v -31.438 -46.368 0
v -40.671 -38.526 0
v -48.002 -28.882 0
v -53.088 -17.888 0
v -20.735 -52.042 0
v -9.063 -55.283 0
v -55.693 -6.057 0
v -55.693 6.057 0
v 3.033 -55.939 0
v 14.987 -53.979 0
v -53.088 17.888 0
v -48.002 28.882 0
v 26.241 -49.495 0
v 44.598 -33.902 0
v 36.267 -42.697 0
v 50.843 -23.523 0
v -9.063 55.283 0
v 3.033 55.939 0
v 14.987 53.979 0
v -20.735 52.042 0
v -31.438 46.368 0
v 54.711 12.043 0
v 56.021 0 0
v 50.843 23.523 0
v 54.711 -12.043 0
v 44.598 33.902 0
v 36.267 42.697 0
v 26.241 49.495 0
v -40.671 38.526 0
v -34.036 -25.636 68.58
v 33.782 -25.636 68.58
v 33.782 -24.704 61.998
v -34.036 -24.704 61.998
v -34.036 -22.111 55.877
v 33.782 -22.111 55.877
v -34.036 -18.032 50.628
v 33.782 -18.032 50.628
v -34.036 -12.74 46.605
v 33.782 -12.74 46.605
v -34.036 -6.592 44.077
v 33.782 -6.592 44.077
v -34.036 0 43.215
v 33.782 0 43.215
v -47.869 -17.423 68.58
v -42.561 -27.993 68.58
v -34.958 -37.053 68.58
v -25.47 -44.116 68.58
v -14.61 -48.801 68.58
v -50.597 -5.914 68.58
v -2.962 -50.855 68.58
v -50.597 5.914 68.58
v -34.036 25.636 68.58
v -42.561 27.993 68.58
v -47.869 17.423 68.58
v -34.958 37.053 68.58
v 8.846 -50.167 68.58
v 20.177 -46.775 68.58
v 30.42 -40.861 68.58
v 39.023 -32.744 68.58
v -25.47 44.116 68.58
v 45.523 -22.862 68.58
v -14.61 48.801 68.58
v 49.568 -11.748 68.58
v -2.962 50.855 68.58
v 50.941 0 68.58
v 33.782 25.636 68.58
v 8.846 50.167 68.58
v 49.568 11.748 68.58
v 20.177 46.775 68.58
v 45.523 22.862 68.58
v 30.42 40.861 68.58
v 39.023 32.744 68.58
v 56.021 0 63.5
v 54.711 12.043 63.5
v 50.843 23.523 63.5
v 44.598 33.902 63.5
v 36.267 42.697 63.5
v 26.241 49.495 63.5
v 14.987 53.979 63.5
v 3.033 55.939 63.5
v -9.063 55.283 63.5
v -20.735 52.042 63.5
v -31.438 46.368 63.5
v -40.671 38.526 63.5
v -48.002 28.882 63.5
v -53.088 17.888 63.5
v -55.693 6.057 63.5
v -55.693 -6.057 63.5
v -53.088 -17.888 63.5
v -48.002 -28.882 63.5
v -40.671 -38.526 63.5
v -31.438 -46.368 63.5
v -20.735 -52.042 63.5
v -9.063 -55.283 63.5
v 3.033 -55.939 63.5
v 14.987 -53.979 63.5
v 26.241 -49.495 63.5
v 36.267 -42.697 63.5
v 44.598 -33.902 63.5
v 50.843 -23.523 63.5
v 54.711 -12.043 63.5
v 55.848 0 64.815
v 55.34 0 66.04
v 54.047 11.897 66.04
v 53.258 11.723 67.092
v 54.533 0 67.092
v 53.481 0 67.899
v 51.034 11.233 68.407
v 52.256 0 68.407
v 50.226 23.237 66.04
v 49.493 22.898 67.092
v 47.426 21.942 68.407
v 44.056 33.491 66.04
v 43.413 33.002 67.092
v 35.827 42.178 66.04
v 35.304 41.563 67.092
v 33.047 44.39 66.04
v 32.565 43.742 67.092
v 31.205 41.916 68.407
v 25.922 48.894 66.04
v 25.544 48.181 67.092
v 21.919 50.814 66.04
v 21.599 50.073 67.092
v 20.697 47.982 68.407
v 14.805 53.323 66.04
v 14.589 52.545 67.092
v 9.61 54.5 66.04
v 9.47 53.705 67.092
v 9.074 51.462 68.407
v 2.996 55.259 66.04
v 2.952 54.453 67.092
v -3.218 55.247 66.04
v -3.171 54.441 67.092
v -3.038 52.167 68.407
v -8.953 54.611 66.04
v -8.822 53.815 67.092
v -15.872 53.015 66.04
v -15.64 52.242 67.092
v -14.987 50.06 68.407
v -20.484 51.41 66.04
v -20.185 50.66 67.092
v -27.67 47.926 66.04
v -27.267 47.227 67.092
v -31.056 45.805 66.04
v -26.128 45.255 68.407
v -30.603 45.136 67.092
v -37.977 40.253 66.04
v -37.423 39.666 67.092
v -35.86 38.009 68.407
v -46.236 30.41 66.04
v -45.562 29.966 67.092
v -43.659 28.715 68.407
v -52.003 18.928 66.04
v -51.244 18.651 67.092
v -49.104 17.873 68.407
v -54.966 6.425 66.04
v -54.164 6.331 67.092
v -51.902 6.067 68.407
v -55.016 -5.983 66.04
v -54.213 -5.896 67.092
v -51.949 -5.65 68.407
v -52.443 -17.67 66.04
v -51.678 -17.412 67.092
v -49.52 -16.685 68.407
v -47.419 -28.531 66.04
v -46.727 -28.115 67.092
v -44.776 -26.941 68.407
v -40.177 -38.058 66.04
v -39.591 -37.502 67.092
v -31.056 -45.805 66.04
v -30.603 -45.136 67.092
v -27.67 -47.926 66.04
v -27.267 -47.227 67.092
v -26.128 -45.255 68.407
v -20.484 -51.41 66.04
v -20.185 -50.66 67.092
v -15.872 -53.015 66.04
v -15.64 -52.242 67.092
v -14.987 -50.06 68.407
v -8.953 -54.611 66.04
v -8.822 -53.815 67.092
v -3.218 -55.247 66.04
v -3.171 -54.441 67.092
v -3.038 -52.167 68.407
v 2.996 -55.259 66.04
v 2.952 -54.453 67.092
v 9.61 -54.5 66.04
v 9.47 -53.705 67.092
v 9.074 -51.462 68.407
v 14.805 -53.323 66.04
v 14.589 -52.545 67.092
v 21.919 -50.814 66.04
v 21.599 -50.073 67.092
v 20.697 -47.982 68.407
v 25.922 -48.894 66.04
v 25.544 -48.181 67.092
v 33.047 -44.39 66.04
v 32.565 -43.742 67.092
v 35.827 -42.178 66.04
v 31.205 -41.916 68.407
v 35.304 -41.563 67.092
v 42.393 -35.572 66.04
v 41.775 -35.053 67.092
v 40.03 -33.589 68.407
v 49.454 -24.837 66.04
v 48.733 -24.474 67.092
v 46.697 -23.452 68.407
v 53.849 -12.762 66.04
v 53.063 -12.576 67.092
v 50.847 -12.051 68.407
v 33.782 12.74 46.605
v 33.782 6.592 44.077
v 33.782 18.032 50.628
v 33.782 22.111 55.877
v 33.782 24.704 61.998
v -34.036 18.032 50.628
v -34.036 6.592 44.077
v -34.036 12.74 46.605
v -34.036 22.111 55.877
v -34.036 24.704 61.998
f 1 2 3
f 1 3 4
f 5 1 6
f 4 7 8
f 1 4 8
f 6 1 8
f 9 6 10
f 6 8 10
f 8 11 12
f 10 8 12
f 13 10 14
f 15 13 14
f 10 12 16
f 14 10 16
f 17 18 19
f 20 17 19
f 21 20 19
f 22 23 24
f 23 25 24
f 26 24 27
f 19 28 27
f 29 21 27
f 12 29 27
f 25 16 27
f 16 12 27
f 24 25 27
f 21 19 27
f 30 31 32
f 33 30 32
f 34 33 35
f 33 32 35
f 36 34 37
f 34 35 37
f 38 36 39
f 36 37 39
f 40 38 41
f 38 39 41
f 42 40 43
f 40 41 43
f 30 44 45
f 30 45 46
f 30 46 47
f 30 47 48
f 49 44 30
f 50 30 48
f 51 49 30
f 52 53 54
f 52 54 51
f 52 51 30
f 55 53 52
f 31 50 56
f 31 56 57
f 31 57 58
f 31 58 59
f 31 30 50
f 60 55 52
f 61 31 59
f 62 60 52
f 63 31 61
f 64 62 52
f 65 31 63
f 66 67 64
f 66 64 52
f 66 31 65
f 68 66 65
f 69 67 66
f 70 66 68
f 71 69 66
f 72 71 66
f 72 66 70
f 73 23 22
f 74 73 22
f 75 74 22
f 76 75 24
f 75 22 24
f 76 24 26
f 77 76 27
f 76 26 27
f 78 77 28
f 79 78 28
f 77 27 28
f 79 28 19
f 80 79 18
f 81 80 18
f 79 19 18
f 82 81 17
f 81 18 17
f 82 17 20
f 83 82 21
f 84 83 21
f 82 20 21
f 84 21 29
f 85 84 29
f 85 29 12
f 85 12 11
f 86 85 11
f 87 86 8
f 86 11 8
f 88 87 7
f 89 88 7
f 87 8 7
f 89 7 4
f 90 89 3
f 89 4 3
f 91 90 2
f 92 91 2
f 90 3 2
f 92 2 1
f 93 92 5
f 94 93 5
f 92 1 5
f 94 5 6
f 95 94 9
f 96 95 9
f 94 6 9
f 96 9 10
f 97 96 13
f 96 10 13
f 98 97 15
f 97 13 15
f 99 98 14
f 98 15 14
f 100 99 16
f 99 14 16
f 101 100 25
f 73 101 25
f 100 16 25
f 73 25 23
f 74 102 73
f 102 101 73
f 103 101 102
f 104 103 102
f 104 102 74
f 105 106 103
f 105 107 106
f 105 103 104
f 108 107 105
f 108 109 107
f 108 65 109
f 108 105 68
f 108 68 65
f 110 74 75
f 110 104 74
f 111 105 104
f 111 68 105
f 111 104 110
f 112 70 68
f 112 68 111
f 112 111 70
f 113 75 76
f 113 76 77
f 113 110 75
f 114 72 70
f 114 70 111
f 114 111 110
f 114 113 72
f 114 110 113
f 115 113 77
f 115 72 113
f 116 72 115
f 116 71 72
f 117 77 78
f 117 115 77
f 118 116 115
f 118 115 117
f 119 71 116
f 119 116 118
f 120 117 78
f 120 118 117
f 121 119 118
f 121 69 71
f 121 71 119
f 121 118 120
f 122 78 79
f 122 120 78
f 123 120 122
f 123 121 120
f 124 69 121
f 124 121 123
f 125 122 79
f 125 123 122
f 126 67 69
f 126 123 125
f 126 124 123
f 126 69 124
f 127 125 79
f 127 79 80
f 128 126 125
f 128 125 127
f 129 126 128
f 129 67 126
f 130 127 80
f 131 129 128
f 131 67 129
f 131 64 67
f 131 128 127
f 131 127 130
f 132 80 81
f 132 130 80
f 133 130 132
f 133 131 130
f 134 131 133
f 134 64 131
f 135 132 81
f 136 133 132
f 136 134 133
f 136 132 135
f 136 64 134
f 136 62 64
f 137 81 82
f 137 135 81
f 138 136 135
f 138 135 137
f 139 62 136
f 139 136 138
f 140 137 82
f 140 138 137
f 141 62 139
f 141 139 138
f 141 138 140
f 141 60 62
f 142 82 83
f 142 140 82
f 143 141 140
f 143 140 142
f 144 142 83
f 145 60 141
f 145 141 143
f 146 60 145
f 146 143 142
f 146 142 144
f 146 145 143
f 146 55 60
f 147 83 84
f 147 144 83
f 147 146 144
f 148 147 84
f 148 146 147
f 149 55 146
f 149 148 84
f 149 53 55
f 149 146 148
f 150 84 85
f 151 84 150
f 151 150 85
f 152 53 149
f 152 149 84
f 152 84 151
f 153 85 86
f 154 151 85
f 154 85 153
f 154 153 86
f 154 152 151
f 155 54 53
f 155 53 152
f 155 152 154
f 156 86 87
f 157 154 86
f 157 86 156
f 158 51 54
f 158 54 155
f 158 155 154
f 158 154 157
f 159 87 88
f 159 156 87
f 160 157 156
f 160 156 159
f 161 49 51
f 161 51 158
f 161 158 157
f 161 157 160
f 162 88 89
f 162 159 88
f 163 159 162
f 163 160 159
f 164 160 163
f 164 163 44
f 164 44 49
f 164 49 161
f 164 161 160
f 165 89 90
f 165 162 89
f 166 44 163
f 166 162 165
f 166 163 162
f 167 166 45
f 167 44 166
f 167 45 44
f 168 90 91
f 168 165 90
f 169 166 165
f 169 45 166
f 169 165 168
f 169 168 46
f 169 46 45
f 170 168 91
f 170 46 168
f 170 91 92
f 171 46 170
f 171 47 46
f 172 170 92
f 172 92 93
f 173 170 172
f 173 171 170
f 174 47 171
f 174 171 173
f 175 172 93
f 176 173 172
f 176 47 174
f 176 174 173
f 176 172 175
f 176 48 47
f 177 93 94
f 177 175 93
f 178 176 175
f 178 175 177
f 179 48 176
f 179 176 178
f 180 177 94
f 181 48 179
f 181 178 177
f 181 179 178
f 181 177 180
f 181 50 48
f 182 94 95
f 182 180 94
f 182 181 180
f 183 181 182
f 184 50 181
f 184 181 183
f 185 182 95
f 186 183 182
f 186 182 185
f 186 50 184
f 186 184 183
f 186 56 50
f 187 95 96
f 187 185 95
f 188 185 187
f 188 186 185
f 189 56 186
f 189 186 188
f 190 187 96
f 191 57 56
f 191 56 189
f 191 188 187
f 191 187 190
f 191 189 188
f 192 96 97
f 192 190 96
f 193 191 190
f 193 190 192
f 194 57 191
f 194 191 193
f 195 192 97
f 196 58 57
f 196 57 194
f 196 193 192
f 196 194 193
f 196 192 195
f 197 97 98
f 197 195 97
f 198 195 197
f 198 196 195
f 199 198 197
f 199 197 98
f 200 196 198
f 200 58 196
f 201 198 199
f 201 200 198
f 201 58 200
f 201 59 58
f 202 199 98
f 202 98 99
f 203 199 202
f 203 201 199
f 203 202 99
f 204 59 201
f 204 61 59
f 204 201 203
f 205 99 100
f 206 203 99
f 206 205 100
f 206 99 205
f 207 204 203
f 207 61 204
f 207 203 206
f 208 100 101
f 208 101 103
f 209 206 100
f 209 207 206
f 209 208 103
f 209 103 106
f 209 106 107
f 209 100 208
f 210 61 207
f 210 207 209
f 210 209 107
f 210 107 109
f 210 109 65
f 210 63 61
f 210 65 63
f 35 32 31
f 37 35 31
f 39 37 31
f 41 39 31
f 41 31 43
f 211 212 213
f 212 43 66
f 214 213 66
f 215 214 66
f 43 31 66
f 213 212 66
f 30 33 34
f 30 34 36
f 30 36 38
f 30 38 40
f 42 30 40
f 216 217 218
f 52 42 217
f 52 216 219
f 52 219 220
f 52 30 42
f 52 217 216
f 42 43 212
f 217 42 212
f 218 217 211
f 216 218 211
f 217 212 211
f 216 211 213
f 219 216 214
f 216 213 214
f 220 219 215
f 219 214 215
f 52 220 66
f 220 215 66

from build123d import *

# Parameters (mm, degrees)
F0_R     = 56.020962
F1_DEPTH = 68.58
F4_DEPTH = 67.818
F5_R     = 5.08


with BuildPart() as f1:
    # F0 (on Top) → F1 (new body)
    with BuildSketch(Plane.XY):
        Circle(F0_R)
    extrude(amount=F1_DEPTH)

    # F3 (on offset) → F4 (cut)
    with BuildSketch(Plane.YZ.offset(33.782)):
        with BuildLine():
            ThreePointArc((0, 43.215101), (18.128478, 50.724162), (25.63754, 68.852641))
            ThreePointArc((25.63754, 68.852641), (-18.128478, 86.981119), (0, 43.215101))
        make_face()
    extrude(amount=-F4_DEPTH, mode=Mode.SUBTRACT)

    # F5
    f5_edges = [f1.edges().sort_by_distance(p)[0] for p in [
        (-56.020962, 0, 68.58),
    ]]
    fillet(f5_edges, radius=F5_R)


solid = f1.part
